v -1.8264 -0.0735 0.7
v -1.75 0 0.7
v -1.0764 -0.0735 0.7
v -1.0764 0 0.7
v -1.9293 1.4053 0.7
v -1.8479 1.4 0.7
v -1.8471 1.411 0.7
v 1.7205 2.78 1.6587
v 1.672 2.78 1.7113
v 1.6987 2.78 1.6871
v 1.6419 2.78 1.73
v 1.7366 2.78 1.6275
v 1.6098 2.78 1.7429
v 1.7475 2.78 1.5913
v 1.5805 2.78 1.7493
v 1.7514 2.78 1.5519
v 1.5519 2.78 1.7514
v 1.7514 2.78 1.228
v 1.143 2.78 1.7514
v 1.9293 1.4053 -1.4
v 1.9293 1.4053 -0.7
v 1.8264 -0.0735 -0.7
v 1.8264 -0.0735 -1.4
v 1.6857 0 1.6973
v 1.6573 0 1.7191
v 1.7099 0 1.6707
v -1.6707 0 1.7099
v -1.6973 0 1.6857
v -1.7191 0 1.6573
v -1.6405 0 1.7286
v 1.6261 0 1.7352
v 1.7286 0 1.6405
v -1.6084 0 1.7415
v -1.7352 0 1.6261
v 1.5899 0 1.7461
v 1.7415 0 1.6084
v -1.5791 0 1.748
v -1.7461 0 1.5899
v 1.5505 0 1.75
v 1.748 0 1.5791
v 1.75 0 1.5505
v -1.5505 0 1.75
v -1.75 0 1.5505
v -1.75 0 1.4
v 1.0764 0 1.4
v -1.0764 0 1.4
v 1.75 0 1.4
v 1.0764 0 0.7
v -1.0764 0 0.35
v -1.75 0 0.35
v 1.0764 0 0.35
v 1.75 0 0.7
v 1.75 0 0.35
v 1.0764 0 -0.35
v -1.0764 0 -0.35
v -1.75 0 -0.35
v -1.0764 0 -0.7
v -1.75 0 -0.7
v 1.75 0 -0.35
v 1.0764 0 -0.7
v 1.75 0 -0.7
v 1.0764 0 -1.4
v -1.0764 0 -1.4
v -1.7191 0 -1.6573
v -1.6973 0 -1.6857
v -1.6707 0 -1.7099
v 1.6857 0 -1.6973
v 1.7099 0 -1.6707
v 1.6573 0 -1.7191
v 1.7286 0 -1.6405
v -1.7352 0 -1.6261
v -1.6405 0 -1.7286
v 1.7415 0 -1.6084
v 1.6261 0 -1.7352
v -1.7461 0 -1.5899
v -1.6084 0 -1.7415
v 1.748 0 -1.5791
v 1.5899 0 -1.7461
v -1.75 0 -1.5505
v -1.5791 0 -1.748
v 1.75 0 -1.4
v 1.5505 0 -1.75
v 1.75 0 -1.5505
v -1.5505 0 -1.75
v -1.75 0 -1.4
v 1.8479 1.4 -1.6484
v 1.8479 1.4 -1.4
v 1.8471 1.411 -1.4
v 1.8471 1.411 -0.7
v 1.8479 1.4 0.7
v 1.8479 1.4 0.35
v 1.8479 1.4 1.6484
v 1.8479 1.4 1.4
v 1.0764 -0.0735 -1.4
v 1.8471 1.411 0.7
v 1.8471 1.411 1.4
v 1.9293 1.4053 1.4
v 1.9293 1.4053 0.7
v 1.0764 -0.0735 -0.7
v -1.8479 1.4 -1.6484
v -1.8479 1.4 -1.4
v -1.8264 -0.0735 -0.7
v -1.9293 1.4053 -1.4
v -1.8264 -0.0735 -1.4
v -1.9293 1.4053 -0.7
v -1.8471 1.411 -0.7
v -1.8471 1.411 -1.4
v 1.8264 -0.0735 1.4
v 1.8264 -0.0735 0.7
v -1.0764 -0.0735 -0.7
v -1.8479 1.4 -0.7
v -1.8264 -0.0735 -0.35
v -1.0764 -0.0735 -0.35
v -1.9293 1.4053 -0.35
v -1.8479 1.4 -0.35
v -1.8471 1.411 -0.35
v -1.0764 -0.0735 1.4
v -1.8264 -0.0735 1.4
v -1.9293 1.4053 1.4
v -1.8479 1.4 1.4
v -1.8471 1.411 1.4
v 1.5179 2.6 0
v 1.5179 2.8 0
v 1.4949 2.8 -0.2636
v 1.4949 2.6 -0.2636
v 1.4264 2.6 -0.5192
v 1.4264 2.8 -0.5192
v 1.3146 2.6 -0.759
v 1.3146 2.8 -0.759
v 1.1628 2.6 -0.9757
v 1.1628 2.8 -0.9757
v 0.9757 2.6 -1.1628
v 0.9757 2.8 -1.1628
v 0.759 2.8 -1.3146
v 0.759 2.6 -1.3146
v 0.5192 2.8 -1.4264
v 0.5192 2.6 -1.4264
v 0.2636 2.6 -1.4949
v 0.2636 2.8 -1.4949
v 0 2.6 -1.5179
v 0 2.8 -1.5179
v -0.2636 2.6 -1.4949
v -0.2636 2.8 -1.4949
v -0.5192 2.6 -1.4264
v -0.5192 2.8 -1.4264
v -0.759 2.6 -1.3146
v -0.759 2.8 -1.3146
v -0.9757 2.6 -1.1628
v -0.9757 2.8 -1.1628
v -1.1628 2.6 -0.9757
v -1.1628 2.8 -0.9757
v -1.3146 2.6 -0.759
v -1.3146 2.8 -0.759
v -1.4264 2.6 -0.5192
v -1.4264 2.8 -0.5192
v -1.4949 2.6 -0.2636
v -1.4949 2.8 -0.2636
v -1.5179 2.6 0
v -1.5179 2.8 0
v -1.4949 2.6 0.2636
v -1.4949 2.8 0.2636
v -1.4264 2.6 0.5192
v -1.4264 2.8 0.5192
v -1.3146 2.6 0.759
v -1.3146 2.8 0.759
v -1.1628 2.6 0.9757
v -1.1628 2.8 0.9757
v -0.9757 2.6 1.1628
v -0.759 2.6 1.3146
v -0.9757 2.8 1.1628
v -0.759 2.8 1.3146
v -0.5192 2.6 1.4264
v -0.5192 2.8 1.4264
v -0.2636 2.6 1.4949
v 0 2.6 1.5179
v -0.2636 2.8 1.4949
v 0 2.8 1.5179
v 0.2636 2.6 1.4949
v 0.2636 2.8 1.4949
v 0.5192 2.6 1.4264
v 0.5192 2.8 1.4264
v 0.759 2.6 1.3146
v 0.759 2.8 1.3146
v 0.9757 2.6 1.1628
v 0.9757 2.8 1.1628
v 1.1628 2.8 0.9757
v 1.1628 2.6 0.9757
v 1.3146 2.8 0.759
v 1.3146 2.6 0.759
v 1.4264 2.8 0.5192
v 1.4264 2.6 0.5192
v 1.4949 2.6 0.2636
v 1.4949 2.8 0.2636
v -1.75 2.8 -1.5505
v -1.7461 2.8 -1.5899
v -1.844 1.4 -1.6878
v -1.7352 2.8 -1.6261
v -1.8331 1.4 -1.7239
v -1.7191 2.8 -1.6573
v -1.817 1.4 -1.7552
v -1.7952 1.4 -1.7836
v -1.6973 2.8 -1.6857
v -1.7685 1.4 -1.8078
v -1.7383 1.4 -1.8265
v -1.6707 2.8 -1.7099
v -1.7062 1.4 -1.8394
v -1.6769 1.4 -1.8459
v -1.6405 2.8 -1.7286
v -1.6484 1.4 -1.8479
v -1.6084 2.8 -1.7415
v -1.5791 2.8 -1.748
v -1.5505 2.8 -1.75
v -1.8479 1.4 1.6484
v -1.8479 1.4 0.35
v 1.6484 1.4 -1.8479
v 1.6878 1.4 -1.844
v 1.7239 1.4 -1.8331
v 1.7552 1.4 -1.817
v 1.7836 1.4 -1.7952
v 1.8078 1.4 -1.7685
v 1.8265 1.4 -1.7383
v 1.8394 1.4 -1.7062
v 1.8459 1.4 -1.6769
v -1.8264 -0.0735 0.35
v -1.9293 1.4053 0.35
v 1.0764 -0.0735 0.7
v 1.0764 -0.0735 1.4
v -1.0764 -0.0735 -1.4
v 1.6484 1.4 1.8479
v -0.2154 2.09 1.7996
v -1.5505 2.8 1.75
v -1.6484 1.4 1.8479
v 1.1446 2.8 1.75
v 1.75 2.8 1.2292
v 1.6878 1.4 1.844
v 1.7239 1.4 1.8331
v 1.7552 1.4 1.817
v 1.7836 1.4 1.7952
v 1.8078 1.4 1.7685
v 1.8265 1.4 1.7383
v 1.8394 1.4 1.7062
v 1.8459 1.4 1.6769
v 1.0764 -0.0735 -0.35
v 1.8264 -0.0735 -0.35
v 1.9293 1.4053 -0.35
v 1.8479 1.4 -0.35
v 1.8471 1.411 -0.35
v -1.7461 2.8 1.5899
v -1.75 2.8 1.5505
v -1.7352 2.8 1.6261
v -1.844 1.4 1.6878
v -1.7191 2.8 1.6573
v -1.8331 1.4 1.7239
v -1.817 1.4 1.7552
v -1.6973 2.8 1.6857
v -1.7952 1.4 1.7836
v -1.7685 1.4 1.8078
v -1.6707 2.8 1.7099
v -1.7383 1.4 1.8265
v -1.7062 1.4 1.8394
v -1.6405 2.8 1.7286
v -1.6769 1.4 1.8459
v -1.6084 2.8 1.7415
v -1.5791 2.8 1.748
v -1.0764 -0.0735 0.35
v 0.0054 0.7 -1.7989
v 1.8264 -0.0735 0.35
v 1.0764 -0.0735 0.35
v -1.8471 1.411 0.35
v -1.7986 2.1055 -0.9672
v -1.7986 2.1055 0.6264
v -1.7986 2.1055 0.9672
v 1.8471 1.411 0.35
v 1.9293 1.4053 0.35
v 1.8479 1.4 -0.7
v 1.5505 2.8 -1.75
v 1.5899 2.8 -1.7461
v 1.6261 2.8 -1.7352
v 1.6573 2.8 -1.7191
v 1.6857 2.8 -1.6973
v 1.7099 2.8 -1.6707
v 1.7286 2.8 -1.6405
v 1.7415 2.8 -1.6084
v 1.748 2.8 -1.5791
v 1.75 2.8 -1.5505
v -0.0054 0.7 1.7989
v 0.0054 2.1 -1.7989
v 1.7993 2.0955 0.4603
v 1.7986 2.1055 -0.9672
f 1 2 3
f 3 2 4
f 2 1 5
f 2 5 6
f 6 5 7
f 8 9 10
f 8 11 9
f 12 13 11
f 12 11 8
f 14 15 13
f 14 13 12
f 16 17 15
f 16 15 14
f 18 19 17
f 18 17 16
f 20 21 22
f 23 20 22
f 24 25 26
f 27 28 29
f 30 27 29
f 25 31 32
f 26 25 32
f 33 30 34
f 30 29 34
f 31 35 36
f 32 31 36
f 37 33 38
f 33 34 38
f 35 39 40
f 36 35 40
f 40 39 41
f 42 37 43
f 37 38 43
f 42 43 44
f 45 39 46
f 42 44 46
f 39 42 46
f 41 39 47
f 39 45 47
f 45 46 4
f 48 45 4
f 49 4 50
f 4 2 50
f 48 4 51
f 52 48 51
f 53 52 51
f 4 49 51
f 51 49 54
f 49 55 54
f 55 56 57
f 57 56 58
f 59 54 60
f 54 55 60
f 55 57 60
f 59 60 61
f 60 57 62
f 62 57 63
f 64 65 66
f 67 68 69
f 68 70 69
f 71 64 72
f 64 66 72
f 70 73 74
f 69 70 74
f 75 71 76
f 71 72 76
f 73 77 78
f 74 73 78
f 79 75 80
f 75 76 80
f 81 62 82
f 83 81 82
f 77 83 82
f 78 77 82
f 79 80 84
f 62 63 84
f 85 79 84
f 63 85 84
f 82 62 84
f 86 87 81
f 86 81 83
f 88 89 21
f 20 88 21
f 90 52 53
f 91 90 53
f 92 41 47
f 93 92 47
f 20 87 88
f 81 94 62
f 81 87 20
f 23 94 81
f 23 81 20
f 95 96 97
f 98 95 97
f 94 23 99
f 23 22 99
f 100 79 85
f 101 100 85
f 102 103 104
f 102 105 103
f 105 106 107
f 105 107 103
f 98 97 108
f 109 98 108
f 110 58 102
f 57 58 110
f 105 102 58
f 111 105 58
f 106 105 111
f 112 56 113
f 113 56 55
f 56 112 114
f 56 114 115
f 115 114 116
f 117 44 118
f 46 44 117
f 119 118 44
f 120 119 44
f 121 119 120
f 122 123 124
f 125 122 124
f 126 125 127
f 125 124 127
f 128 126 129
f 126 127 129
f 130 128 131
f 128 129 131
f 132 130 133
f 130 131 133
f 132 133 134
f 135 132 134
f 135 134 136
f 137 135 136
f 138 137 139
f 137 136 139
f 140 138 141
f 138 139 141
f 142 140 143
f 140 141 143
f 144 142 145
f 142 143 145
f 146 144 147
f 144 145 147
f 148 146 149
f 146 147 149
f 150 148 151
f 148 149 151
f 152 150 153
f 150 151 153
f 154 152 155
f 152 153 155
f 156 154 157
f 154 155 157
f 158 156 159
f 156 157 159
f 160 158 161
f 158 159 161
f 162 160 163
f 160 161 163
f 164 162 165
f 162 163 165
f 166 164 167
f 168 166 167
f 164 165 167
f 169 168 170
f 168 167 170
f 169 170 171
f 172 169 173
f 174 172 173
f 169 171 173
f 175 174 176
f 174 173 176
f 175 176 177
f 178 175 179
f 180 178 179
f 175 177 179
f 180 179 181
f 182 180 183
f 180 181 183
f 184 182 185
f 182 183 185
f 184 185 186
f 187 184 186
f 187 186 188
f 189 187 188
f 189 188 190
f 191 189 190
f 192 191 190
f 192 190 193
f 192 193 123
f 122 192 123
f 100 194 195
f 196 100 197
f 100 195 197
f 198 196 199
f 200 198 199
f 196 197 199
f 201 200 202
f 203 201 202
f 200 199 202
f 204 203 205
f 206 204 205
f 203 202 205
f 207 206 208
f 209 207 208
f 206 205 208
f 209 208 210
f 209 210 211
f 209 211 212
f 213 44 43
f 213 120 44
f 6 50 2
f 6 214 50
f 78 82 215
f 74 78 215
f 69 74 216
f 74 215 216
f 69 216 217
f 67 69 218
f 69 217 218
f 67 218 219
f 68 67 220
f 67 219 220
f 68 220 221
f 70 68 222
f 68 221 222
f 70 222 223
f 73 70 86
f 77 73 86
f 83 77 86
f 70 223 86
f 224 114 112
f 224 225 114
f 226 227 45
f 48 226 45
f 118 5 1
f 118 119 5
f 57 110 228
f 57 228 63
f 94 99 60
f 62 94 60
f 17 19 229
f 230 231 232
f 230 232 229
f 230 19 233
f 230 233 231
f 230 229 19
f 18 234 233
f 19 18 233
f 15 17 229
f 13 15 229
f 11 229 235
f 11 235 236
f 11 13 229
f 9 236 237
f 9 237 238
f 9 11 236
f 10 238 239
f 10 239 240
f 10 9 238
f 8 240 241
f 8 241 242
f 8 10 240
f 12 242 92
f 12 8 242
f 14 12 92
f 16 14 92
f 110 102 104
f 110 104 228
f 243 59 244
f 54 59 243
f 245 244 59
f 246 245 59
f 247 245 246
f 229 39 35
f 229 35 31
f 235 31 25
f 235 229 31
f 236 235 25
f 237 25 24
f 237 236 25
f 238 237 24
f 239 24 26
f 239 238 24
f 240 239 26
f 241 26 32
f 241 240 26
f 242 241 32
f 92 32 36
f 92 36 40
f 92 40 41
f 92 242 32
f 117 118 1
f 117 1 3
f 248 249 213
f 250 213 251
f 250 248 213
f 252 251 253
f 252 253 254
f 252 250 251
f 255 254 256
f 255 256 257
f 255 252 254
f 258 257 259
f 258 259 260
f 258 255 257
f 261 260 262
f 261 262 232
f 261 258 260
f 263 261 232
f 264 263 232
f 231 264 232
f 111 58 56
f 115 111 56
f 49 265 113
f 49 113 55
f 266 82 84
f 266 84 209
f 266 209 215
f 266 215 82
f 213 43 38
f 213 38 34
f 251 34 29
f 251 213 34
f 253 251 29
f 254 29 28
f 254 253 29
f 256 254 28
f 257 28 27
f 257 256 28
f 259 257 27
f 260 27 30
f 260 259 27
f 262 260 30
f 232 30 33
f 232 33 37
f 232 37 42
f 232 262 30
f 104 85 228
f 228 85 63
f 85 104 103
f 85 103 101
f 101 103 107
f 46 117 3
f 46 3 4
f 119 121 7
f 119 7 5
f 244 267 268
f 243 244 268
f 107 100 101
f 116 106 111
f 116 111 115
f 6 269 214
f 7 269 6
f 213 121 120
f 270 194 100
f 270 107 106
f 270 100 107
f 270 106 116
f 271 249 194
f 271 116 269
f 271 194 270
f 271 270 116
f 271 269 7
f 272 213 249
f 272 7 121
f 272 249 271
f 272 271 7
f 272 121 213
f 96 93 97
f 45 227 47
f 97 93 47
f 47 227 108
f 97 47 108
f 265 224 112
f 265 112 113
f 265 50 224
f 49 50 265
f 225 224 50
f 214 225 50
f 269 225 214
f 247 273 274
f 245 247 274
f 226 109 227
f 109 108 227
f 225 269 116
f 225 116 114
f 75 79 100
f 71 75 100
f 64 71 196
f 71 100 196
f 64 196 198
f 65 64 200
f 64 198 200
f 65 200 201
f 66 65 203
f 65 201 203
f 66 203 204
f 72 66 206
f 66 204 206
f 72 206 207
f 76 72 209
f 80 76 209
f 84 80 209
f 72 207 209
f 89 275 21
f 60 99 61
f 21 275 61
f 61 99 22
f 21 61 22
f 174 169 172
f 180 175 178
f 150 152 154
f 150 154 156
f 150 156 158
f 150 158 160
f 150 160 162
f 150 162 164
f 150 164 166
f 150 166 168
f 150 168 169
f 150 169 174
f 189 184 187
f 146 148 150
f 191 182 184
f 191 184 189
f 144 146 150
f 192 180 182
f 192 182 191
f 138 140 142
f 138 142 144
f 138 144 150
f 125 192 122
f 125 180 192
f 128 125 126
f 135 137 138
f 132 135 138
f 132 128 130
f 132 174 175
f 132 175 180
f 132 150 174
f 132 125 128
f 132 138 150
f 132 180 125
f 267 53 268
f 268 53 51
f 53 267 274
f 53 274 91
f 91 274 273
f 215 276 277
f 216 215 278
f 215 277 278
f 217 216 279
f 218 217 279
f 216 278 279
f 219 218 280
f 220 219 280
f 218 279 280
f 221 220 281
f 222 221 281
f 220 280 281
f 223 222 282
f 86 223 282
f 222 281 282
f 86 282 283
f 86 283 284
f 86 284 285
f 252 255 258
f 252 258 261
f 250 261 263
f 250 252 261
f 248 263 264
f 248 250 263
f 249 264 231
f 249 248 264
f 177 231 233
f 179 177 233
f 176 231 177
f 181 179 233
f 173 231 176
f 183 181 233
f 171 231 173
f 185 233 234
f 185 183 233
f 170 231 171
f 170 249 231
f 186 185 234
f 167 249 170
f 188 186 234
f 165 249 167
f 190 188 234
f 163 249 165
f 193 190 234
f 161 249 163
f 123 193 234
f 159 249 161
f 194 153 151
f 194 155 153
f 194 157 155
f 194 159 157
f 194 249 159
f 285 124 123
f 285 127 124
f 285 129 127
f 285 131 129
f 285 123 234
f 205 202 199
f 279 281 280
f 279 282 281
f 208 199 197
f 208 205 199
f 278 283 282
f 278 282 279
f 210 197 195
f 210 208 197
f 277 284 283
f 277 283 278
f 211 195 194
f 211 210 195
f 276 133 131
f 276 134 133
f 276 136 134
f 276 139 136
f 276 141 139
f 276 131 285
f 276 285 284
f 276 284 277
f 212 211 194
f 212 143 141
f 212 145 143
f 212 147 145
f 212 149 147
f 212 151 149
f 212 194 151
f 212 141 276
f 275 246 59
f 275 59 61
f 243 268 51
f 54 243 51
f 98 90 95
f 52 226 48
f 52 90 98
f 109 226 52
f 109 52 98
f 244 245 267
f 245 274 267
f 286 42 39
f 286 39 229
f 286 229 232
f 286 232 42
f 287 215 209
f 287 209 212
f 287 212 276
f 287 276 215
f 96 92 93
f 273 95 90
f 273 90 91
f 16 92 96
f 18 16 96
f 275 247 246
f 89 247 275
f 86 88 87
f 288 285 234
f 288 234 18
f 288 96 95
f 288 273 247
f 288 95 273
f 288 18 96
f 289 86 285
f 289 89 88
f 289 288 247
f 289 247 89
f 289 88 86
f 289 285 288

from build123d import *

# Parameters (mm, degrees)
SKETCH1_W            = 3.5
SKETCH1_H            = 3.5
BOSS_EXTRUDE1_DEPTH  = 1.4
BOSS_EXTRUDE1_TAPER  = -4
SKETCH2_W            = 3.695795074
SKETCH2_H            = 3.695795074
BOSS_EXTRUDE2_DEPTH  = 1.4
BOSS_EXTRUDE2_TAPER  = 4
FILLET1_R            = 0.2
SKETCH3_R            = 1.517913715
CUT_EXTRUDE1_DEPTH   = 0.2
EXTRUDE_THIN1_DEPTH  = 0.35
LPATTERN1_COUNT      = 2
LPATTERN1_PITCH      = 1.05
LPATTERN2_COUNT      = 2
LPATTERN2_PITCH      = 1.05
MIRROR1_COPY_1_DEPTH = 0.35
MIRROR1_COPY_2_DEPTH = 0.35
CUT_EXTRUDE2_DEPTH   = 0.02


with BuildPart() as part:
    # Sketch1 → Boss-Extrude1 (new body)
    with BuildSketch(Plane(origin=(0, 0, 0), x_dir=(1, 0, 0), z_dir=(0, 1, 0))):
        Rectangle(SKETCH1_W, SKETCH1_H)
    extrude(amount=BOSS_EXTRUDE1_DEPTH, taper=BOSS_EXTRUDE1_TAPER)

    # Sketch2 → Boss-Extrude2 (add)
    with BuildSketch(Plane(origin=(0, 1.4, 0), x_dir=(1, 0, 0), z_dir=(0, 1, 0))):
        Rectangle(SKETCH2_W, SKETCH2_H)
    extrude(amount=BOSS_EXTRUDE2_DEPTH, taper=BOSS_EXTRUDE2_TAPER)

    # Fillet1
    fillet1_edges = [part.edges().sort_by_distance(p)[0] for p in [
        (-1.798948768, 2.1, 1.798948768),
        (1.798948768, 2.1, 1.798948768),
        (1.798948768, 2.1, -1.798948768),
        (-1.798948768, 2.1, -1.798948768),
        (1.798948768, 0.7, 1.798948768),
        (-1.798948768, 0.7, 1.798948768),
        (-1.798948768, 0.7, -1.798948768),
        (1.798948768, 0.7, -1.798948768),
    ]]
    fillet(fillet1_edges, radius=FILLET1_R)

    # Sketch3 → Cut-Extrude1 (cut)
    with BuildSketch(Plane(origin=(0, 2.8, 0), x_dir=(1, 0, 0), z_dir=(0, 1, 0))):
        Circle(SKETCH3_R)
    extrude(amount=-CUT_EXTRUDE1_DEPTH, mode=Mode.SUBTRACT)

    # Sketch4 → Extrude-Thin1 (add, symmetric)
    with BuildSketch(Plane.XY):
        Polygon((-1.929260437, 1.405319652), (-1.826413832, -0.073543587), (-1.076413832, -0.073543587), (-1.076413832, 0.126456413), (-1.639839647, 0.126456413), (-1.729742331, 1.419195012), align=None)
    extrude_thin1 = extrude(amount=EXTRUDE_THIN1_DEPTH, both=True)

    # LPattern1: Extrude-Thin1 ×2
    with Locations(*[(0, 0, i * LPATTERN1_PITCH) for i in range(1, LPATTERN1_COUNT)]):
        add(extrude_thin1)

    # LPattern2: Extrude-Thin1 ×2
    with Locations(*[(0, 0, -i * LPATTERN2_PITCH) for i in range(1, LPATTERN2_COUNT)]):
        add(extrude_thin1)

    # Mirror1: Extrude-Thin1 across plane
    add(extrude_thin1.mirror(Plane(origin=(0, 0, 0), x_dir=(0, 0, 1), z_dir=(1, 0, 0))))

    # Mirror1 copy 1 sketch → Mirror1 copy 1 (add, symmetric)
    with BuildSketch(Plane(origin=(0, 0, 1.05), x_dir=(-1, 0, 0), z_dir=(0, 0, 1))):
        Polygon((-1.929260437, -1.405319652), (-1.826413832, 0.073543587), (-1.076413832, 0.073543587), (-1.076413832, -0.126456413), (-1.639839647, -0.126456413), (-1.729742331, -1.419195012), align=None)
    extrude(amount=MIRROR1_COPY_1_DEPTH, both=True)

    # Mirror1 copy 2 sketch → Mirror1 copy 2 (add, symmetric)
    with BuildSketch(Plane(origin=(0, 0, -1.05), x_dir=(-1, 0, 0), z_dir=(0, 0, 1))):
        Polygon((-1.929260437, -1.405319652), (-1.826413832, 0.073543587), (-1.076413832, 0.073543587), (-1.076413832, -0.126456413), (-1.639839647, -0.126456413), (-1.729742331, -1.419195012), align=None)
    extrude(amount=MIRROR1_COPY_2_DEPTH, both=True)

    # Sketch5 → Cut-Extrude2 (cut)
    with BuildSketch(Plane(origin=(0, 2.8, 0), x_dir=(1, 0, 0), z_dir=(0, 1, 0))):
        Polygon((1.991844577, -1.021164559), (0.940848245, -1.925296774), (2.028560606, -1.925296774), align=None)
    extrude(amount=-CUT_EXTRUDE2_DEPTH, mode=Mode.SUBTRACT)


solid = part.part
